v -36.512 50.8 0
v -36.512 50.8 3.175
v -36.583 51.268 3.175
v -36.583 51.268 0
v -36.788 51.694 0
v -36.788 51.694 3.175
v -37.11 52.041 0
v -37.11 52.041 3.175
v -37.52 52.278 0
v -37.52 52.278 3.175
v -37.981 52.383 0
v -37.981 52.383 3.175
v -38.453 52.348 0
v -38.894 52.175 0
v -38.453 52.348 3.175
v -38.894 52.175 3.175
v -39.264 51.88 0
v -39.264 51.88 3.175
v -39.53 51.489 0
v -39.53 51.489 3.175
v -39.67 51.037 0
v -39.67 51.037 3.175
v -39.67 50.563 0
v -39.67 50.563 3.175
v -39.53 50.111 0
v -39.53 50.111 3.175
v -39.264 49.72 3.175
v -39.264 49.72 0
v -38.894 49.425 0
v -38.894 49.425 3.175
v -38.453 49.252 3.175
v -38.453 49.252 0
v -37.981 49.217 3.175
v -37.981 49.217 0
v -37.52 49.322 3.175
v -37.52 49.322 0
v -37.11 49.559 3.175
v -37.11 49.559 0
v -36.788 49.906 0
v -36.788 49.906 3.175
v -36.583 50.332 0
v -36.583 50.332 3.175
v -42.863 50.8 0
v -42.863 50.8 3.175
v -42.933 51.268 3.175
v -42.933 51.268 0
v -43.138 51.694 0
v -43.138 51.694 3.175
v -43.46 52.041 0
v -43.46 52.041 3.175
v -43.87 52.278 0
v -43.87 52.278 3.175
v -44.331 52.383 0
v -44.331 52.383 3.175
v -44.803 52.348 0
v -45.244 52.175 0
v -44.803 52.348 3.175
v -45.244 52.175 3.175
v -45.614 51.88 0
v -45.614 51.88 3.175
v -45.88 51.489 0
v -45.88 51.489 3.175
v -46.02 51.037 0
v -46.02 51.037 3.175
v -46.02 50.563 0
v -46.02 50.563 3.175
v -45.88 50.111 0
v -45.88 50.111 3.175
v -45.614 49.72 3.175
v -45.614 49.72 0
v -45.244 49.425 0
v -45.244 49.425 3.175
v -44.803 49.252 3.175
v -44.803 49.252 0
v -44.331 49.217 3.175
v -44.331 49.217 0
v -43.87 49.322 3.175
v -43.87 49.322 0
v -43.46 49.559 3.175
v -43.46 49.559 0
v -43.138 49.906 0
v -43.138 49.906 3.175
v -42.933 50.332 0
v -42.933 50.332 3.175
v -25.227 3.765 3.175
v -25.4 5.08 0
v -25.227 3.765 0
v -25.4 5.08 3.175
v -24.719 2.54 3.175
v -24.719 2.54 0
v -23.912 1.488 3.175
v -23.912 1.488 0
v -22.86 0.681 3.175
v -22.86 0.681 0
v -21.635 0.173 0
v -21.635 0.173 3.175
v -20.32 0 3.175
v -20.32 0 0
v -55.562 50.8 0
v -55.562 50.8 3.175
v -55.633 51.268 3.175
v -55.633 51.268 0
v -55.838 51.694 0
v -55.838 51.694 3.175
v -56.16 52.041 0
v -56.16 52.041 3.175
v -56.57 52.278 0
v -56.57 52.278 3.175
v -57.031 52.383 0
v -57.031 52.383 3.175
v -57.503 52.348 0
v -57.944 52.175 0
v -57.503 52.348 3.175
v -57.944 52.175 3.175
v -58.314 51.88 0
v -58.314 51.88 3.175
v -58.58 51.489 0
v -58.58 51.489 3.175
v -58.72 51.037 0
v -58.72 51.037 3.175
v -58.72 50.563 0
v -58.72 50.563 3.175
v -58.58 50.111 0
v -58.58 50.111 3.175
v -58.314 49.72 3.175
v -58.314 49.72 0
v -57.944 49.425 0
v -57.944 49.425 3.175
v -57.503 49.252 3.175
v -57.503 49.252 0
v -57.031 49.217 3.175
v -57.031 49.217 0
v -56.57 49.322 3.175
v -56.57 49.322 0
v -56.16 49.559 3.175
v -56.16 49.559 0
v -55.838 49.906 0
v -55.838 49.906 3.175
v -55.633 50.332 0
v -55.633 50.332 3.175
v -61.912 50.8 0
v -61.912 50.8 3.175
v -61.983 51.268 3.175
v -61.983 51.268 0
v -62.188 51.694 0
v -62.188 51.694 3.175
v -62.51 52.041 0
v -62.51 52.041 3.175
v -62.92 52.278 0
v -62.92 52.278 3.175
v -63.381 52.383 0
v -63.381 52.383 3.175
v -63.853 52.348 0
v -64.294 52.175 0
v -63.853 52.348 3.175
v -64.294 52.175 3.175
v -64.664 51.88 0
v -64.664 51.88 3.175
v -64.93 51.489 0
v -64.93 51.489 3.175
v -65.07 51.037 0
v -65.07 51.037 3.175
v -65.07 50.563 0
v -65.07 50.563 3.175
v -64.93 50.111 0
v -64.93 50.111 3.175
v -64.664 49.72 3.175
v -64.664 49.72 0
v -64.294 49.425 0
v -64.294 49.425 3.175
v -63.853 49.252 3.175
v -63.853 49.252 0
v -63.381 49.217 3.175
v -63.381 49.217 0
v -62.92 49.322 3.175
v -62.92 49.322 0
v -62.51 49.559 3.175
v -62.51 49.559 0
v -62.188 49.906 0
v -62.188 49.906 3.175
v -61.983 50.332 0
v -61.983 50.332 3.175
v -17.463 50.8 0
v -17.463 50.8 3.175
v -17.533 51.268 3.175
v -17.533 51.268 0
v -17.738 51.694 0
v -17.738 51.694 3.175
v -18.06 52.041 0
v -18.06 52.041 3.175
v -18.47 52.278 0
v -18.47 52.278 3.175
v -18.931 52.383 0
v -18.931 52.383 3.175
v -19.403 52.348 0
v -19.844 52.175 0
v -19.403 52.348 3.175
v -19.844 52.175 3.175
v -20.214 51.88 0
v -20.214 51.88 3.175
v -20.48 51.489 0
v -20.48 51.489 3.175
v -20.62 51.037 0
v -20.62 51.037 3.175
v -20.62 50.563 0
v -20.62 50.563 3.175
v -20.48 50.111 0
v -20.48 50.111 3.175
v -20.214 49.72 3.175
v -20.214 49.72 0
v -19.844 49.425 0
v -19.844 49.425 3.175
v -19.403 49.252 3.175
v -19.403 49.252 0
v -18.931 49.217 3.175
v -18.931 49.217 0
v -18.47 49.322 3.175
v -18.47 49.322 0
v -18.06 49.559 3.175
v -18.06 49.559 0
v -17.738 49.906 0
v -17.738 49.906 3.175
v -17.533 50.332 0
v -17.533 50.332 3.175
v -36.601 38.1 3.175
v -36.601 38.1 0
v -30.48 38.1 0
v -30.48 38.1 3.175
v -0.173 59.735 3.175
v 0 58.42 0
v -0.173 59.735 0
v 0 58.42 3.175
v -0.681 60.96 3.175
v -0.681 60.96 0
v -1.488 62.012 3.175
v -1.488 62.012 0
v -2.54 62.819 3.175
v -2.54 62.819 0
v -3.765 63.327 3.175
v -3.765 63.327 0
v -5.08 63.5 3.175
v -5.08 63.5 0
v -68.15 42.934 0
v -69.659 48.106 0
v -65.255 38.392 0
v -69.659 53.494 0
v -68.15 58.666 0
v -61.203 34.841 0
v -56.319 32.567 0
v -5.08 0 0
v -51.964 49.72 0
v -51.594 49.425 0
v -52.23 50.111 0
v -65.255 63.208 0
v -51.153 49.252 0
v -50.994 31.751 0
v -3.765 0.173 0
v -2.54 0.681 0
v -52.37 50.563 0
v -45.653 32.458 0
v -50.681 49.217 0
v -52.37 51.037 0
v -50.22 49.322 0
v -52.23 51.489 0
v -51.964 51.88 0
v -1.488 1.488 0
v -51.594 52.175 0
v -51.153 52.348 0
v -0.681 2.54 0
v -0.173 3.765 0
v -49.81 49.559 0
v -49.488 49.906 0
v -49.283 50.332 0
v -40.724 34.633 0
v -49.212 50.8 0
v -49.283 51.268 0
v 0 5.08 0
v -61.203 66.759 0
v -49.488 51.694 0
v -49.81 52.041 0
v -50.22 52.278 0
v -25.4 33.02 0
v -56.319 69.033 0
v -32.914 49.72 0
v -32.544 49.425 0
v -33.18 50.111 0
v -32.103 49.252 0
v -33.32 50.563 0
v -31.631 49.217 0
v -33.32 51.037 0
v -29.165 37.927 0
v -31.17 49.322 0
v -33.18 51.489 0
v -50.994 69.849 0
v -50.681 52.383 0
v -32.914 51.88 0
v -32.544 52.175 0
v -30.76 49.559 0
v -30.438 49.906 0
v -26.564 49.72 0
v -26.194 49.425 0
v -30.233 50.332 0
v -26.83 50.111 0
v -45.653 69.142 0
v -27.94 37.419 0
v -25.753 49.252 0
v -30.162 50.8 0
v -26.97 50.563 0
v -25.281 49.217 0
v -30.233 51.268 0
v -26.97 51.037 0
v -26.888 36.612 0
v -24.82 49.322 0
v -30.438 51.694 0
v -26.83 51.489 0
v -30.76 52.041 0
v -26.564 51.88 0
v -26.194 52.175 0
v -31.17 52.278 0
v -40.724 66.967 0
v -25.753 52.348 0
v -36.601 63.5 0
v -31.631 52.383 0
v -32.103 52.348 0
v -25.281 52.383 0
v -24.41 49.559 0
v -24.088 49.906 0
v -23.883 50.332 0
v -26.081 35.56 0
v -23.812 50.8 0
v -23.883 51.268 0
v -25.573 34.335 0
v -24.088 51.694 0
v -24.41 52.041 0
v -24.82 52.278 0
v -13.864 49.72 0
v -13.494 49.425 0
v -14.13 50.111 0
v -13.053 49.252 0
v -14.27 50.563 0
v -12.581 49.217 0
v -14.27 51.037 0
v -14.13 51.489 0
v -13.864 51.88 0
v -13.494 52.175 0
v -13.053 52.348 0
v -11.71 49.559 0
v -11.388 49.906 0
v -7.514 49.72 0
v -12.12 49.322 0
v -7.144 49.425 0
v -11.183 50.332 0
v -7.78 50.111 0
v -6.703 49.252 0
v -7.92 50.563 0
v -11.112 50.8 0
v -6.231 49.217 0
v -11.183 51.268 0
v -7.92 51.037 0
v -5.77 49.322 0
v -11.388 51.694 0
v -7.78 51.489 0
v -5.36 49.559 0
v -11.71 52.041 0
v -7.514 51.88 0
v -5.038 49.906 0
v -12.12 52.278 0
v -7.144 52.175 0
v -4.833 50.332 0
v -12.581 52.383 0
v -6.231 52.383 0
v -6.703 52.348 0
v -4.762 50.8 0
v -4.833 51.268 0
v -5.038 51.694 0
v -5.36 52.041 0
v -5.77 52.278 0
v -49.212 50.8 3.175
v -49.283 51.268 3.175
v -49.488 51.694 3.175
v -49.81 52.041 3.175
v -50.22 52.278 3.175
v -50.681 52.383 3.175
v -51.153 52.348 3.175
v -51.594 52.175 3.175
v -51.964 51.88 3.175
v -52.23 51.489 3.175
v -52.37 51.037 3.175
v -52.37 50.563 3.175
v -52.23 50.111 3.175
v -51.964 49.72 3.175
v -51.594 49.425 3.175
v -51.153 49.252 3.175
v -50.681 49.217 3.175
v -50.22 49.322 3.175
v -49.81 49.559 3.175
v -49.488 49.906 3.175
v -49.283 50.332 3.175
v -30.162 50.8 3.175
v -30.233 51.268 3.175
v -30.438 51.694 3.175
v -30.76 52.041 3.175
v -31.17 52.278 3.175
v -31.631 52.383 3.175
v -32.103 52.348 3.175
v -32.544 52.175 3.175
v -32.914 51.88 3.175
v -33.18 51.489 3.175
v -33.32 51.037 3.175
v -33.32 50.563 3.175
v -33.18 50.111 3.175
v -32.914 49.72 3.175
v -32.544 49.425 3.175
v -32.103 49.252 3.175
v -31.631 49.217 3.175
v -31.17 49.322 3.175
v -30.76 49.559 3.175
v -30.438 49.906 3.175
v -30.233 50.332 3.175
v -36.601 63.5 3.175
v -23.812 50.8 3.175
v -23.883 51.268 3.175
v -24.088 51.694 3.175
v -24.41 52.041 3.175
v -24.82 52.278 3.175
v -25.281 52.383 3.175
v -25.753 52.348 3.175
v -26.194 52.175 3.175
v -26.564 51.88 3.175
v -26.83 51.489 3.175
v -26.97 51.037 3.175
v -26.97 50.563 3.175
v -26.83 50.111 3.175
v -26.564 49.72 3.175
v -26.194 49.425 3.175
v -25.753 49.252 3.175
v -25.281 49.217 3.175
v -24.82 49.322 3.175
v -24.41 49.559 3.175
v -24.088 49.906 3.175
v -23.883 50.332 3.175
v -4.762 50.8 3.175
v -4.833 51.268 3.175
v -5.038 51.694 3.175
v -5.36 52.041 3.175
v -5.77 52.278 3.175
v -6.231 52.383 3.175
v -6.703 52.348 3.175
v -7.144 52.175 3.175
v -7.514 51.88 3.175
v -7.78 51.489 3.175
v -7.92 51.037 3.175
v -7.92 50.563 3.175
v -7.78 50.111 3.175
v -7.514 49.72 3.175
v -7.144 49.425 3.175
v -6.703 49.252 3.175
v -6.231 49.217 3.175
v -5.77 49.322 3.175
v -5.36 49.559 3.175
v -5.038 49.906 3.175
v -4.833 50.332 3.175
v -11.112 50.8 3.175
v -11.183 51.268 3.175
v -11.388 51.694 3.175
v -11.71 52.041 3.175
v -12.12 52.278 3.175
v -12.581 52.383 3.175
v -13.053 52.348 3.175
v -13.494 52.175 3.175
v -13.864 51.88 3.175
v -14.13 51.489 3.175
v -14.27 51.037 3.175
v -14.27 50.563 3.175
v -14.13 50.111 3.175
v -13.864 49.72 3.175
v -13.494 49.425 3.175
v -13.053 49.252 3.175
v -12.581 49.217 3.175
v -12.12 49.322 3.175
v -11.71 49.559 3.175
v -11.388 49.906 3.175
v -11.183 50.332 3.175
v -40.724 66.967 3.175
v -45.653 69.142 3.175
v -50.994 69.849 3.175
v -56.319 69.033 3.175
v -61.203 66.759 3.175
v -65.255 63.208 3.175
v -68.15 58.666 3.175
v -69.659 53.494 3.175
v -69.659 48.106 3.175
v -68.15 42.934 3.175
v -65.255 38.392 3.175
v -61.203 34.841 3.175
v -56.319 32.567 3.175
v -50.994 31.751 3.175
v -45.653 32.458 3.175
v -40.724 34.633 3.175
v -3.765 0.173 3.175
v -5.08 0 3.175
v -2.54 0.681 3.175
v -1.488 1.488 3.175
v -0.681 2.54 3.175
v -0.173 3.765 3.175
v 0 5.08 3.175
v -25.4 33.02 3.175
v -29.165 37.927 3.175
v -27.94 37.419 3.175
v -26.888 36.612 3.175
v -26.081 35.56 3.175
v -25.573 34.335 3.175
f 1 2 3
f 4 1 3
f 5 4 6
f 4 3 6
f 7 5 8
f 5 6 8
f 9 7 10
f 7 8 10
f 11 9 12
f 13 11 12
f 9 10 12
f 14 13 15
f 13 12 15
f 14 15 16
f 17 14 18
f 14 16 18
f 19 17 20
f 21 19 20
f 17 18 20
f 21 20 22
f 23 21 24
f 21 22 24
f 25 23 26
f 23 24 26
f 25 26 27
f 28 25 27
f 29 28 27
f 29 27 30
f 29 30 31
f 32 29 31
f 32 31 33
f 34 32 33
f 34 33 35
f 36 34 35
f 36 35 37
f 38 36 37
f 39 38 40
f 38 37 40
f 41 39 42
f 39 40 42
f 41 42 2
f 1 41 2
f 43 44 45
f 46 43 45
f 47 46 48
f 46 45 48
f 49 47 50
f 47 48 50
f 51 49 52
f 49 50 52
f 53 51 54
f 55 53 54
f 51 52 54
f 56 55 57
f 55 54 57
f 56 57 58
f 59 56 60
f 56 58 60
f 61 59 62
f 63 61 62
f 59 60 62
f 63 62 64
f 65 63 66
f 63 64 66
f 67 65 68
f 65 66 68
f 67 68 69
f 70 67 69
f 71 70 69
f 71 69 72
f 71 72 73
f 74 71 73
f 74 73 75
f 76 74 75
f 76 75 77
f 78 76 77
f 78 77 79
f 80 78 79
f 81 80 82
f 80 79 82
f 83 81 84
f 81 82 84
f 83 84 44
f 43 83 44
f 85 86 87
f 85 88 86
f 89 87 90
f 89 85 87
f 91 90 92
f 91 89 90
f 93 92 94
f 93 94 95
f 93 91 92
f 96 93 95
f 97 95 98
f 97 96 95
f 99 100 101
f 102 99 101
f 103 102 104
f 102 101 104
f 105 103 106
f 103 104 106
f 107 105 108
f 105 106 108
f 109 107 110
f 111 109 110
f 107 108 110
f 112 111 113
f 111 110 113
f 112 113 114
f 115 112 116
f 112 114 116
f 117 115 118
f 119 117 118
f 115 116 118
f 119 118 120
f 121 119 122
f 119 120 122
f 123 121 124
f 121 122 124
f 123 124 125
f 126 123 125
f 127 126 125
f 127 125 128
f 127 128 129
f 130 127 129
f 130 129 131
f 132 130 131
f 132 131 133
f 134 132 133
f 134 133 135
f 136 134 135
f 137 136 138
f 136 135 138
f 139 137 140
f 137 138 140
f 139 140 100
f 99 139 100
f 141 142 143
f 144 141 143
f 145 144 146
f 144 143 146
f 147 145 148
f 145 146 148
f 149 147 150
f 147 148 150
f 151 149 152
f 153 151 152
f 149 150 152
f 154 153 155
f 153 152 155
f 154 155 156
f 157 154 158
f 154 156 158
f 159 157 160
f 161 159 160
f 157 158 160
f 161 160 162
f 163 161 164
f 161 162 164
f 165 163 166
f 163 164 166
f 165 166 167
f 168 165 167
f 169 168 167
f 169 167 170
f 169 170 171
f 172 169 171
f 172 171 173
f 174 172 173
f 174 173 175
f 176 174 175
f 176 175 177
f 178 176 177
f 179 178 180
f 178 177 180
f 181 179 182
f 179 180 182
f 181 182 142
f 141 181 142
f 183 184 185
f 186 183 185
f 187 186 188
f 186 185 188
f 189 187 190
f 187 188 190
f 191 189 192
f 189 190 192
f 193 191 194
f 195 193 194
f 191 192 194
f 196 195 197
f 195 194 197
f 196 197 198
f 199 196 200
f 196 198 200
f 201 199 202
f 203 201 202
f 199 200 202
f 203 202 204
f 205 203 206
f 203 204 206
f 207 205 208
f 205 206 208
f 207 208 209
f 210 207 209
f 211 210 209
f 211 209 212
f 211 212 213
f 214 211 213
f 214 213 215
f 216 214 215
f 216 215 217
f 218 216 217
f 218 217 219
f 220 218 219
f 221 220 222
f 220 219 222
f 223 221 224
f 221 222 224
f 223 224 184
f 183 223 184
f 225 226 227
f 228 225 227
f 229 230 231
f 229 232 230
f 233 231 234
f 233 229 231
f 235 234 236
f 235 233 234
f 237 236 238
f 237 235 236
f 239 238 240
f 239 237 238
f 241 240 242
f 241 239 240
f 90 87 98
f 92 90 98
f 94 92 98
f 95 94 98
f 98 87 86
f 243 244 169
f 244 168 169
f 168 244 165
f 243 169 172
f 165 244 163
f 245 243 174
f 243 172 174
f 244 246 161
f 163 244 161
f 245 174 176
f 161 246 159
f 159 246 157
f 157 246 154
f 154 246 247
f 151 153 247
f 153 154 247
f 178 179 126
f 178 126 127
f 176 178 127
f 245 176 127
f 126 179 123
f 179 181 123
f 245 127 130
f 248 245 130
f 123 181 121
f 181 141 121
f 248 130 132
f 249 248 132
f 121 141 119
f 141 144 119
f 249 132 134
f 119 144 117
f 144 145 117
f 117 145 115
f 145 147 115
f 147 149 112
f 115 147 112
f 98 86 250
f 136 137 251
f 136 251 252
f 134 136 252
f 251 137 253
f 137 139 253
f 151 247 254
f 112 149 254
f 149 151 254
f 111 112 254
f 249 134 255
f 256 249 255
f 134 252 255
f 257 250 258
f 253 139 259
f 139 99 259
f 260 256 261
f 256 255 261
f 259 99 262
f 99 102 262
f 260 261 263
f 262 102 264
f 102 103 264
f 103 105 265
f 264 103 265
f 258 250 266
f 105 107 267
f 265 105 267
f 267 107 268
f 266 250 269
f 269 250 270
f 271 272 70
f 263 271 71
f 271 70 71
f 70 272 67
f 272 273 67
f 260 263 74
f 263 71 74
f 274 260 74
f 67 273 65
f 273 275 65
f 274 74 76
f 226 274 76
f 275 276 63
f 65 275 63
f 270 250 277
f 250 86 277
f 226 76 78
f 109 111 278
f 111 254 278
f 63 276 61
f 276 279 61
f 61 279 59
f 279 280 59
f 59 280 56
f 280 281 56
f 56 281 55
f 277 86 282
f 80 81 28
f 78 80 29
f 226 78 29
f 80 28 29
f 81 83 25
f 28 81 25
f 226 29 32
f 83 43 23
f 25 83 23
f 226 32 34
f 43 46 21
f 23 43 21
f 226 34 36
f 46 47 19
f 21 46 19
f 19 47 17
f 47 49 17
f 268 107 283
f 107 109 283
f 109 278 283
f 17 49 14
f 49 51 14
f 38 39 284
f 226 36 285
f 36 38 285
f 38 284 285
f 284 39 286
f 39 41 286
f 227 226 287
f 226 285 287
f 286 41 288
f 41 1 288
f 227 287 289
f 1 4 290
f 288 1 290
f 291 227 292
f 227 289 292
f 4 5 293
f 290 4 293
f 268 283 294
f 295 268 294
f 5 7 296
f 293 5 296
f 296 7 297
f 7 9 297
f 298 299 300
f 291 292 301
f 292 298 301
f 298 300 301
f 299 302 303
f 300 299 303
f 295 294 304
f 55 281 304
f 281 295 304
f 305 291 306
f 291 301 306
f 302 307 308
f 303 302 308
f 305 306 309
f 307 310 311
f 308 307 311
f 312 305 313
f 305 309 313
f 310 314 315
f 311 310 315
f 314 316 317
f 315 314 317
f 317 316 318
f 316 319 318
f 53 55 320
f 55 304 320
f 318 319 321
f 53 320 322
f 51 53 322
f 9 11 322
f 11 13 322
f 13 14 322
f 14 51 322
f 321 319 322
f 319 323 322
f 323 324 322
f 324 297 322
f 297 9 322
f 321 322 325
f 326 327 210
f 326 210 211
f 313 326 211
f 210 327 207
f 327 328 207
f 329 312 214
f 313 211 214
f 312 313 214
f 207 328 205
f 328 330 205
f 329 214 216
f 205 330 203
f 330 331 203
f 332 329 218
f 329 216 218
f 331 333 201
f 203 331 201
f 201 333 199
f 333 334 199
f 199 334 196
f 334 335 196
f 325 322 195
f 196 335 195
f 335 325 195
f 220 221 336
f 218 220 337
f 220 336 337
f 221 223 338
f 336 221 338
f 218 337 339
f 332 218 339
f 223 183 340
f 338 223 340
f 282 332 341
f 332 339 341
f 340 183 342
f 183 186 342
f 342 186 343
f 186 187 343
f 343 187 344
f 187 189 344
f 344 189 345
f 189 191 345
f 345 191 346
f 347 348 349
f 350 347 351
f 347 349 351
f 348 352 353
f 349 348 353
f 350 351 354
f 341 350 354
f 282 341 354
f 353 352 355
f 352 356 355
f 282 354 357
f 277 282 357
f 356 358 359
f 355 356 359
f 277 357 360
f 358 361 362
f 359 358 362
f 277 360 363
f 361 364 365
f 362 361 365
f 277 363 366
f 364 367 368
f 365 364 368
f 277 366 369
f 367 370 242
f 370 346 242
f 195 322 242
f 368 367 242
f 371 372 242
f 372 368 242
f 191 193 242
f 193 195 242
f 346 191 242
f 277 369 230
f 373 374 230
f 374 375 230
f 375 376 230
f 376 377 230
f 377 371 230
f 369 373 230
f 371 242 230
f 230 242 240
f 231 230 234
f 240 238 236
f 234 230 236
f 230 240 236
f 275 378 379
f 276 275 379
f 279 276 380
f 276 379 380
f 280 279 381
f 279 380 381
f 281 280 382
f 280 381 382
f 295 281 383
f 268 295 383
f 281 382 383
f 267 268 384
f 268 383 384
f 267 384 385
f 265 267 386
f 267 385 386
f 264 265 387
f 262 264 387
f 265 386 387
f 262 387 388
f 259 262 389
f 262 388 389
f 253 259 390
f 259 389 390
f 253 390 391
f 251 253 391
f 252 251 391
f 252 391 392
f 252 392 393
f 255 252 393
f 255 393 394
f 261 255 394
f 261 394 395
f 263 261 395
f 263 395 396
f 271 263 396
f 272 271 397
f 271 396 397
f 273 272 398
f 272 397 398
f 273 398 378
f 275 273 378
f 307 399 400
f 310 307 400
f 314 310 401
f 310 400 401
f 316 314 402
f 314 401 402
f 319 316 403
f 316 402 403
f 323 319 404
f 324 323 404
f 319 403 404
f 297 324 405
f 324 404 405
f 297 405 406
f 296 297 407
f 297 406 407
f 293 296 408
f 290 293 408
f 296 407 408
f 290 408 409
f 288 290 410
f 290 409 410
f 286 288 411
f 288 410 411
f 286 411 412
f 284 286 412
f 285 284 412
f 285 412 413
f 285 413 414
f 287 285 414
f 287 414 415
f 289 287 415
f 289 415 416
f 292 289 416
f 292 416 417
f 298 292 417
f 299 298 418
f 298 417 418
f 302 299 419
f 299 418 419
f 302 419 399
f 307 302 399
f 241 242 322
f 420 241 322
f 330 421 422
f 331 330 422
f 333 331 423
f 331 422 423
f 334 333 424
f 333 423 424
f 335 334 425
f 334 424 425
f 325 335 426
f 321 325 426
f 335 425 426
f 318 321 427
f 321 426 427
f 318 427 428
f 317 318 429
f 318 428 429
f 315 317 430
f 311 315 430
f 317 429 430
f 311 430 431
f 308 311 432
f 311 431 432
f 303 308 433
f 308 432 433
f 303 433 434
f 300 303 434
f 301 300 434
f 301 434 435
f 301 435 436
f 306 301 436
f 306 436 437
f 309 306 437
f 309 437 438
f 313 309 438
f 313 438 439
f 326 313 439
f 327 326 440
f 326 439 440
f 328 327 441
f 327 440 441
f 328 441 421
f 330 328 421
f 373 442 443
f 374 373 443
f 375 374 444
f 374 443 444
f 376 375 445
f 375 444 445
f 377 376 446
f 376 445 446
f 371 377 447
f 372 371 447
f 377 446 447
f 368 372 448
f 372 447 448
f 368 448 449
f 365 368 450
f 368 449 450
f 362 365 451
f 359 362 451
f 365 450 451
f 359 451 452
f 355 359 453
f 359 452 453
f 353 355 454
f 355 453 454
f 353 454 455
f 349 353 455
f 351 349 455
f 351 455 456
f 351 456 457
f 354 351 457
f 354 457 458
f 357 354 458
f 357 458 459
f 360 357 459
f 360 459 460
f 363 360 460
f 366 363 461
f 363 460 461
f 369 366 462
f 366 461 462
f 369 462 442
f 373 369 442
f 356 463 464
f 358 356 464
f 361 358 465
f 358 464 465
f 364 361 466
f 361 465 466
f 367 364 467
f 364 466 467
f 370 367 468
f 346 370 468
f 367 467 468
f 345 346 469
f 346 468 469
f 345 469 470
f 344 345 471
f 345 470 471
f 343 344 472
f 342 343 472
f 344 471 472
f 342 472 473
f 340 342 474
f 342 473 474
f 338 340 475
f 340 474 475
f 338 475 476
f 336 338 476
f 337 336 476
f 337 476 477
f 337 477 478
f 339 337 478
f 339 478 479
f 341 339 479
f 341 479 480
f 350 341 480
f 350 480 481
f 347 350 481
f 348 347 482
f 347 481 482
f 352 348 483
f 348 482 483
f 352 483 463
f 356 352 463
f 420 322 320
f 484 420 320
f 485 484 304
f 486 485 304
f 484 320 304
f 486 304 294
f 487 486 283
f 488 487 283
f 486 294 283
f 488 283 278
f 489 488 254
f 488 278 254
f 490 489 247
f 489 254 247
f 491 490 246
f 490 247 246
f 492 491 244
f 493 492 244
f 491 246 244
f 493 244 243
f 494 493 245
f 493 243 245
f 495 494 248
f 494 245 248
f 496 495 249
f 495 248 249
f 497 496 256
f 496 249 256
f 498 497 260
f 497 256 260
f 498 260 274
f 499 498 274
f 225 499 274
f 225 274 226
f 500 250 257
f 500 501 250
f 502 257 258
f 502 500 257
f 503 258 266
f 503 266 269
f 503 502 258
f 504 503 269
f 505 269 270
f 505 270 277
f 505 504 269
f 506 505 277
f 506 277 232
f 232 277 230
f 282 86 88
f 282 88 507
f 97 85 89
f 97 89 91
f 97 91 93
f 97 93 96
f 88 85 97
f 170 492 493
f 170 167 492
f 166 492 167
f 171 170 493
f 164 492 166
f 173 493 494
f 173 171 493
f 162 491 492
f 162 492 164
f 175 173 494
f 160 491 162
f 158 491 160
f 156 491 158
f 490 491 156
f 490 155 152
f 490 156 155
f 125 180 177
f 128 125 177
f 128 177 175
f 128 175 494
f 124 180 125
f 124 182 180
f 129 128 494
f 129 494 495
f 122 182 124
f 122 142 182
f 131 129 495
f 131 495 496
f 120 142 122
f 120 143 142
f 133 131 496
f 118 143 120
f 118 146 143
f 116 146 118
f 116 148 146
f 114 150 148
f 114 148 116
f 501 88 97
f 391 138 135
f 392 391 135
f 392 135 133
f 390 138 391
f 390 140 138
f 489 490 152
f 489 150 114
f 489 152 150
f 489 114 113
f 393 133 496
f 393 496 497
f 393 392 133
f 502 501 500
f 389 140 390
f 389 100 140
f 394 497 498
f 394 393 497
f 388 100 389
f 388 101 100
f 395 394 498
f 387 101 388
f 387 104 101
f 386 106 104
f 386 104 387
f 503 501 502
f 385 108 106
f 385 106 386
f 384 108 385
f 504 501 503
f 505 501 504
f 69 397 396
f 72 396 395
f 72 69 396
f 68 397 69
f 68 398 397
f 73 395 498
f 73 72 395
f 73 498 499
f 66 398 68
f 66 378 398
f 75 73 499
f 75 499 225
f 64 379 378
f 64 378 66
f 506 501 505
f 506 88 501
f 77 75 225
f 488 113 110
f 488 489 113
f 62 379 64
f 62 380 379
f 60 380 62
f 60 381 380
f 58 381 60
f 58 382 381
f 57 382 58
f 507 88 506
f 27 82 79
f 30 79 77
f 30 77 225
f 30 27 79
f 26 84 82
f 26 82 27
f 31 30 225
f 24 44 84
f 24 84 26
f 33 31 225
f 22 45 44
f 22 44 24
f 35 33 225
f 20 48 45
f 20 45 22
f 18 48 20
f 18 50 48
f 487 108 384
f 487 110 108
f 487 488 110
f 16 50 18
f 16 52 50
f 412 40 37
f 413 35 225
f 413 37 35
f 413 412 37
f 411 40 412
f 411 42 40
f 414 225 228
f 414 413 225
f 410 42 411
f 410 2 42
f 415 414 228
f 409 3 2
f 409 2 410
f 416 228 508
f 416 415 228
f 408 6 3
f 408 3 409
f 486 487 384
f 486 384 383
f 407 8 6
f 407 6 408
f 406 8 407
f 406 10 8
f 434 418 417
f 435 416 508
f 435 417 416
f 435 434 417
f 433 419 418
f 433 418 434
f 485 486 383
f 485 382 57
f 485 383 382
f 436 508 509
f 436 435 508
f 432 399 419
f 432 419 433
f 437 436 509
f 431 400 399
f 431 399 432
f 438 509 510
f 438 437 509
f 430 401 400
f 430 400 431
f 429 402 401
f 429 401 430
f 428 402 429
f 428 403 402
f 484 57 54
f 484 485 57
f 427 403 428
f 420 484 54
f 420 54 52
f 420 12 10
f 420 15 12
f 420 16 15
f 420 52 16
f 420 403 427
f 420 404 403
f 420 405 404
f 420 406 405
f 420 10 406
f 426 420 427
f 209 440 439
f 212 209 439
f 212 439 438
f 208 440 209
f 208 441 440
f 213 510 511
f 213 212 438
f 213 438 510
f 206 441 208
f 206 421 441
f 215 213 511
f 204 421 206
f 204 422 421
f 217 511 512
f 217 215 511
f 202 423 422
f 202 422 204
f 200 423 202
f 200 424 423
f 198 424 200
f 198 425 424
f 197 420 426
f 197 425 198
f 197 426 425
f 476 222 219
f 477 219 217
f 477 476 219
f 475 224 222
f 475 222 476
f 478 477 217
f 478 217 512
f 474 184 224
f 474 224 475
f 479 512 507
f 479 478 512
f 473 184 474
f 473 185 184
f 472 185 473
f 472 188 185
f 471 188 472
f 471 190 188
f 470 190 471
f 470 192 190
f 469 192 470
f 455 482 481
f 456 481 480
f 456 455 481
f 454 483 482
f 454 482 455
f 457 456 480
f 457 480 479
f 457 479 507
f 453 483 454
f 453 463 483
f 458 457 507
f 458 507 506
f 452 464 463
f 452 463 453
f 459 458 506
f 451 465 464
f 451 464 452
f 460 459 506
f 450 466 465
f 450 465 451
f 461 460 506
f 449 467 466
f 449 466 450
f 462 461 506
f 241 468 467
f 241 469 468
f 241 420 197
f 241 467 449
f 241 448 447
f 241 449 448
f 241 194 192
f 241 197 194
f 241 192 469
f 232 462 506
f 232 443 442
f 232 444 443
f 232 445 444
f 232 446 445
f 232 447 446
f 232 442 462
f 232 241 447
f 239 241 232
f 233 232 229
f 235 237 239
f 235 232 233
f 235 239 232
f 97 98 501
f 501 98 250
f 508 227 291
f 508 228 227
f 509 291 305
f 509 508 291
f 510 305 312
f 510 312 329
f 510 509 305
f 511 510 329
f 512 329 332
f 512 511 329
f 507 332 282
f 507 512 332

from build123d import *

# Parameters (mm, degrees)
SKETCH1_W           = 25.4
SKETCH1_H           = 63.5
BOSS_EXTRUDE1_DEPTH = 3.175
FILLET1_R           = 5.08
SKETCH2_R           = 1.5875
CUT_EXTRUDE1_DEPTH  = 3.175


with BuildPart() as part:
    # Sketch1 → Boss-Extrude1 (new body)
    with BuildSketch(Plane.XY):
        with BuildLine():
            ThreePointArc((-36.600968343, 63.5), (-69.85, 50.8), (-36.600968343, 38.1))
            Line((-36.600968343, 38.1), (-50.8, 38.1))
            Line((-50.8, 38.1), (-50.8, 63.5))
            Line((-50.8, 63.5), (-36.600968343, 63.5))
        make_face()
        with BuildLine():
            Line((-50.8, 38.1), (-36.600968343, 38.1))
            ThreePointArc((-36.600968343, 38.1), (-33.004016562, 44.00253919), (-31.75, 50.8))
            ThreePointArc((-31.75, 50.8), (-33.004016562, 57.59746081), (-36.600968343, 63.5))
            Line((-36.600968343, 63.5), (-50.8, 63.5))
            Line((-50.8, 63.5), (-50.8, 38.1))
        make_face()
        with BuildLine():
            Line((-36.600968343, 38.1), (-25.4, 38.1))
            Line((-25.4, 38.1), (-25.4, 63.5))
            Line((-25.4, 63.5), (-36.600968343, 63.5))
            ThreePointArc((-36.600968343, 63.5), (-33.004016562, 57.59746081), (-31.75, 50.8))
            ThreePointArc((-31.75, 50.8), (-33.004016562, 44.00253919), (-36.600968343, 38.1))
        make_face()
        with Locations((-12.7, 31.75)):
            Rectangle(SKETCH1_W, SKETCH1_H)
    extrude(amount=BOSS_EXTRUDE1_DEPTH)

    # Fillet1
    fillet1_edges = [part.edges().sort_by_distance(p)[0] for p in [
        (0, 63.5, 1.5875),
        (0, 0, 1.5875),
        (-25.4, 0, 1.5875),
        (-25.4, 38.1, 1.5875),
    ]]
    fillet(fillet1_edges, radius=FILLET1_R)

    # Sketch2 → Cut-Extrude1 (cut)
    with BuildSketch(Plane.XY.offset(3.175)):
        with Locations((-6.35, 50.8)):
            Circle(SKETCH2_R)
        with Locations((-12.7, 50.8)):
            Circle(SKETCH2_R)
        with Locations((-19.05, 50.8)):
            Circle(SKETCH2_R)
        with Locations((-25.4, 50.8)):
            Circle(SKETCH2_R)
        with Locations((-31.75, 50.8)):
            Circle(SKETCH2_R)
        with Locations((-38.1, 50.8)):
            Circle(SKETCH2_R)
        with Locations((-44.45, 50.8)):
            Circle(SKETCH2_R)
        with Locations((-50.8, 50.8)):
            Circle(SKETCH2_R)
        with Locations((-57.15, 50.8)):
            Circle(SKETCH2_R)
        with Locations((-63.5, 50.8)):
            Circle(SKETCH2_R)
    extrude(amount=-CUT_EXTRUDE1_DEPTH, mode=Mode.SUBTRACT)


solid = part.part
